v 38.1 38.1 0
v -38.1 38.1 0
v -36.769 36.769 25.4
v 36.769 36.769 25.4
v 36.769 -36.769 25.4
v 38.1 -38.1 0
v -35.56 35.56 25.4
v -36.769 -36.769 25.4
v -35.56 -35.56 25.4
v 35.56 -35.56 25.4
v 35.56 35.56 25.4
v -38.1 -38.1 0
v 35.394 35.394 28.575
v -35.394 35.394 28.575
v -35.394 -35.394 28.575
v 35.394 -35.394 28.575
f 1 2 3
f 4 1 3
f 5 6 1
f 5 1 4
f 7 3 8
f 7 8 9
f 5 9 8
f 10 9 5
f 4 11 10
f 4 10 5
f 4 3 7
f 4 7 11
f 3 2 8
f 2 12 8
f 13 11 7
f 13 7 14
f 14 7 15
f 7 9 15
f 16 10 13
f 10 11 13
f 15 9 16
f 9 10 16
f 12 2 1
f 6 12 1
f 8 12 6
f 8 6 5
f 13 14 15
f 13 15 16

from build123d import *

# Parameters (mm, degrees)
F0_W     = 38.1
F0_H     = 38.1
F1_DEPTH = 25.4
F1_TAPER = 3
F2_W     = 71.12
F2_H     = 71.12
F3_DEPTH = 3.175
F3_TAPER = 3


# Not quite as in the source:
# - a feature of the source that left no trace in its solid (it failed there, or was rolled back) is left out


with BuildPart() as f1:
    # F0 (on Top) → F1 (new body)
    with BuildSketch(Plane.XY):
        with Locations((-19.05, 19.05)):
            Rectangle(F0_W, F0_H)
        with Locations((19.05, 19.05)):
            Rectangle(F0_W, F0_H)
        with Locations((-19.05, -19.05)):
            Rectangle(F0_W, F0_H)
        with Locations((19.05, -19.05)):
            Rectangle(F0_W, F0_H)
    extrude(amount=F1_DEPTH, taper=F1_TAPER)

    # F2 (on face) → F3 (join)
    with BuildSketch(Plane.XY.offset(25.4)):
        Rectangle(F2_W, F2_H)
    extrude(amount=F3_DEPTH, taper=F3_TAPER)


solid = f1.part
